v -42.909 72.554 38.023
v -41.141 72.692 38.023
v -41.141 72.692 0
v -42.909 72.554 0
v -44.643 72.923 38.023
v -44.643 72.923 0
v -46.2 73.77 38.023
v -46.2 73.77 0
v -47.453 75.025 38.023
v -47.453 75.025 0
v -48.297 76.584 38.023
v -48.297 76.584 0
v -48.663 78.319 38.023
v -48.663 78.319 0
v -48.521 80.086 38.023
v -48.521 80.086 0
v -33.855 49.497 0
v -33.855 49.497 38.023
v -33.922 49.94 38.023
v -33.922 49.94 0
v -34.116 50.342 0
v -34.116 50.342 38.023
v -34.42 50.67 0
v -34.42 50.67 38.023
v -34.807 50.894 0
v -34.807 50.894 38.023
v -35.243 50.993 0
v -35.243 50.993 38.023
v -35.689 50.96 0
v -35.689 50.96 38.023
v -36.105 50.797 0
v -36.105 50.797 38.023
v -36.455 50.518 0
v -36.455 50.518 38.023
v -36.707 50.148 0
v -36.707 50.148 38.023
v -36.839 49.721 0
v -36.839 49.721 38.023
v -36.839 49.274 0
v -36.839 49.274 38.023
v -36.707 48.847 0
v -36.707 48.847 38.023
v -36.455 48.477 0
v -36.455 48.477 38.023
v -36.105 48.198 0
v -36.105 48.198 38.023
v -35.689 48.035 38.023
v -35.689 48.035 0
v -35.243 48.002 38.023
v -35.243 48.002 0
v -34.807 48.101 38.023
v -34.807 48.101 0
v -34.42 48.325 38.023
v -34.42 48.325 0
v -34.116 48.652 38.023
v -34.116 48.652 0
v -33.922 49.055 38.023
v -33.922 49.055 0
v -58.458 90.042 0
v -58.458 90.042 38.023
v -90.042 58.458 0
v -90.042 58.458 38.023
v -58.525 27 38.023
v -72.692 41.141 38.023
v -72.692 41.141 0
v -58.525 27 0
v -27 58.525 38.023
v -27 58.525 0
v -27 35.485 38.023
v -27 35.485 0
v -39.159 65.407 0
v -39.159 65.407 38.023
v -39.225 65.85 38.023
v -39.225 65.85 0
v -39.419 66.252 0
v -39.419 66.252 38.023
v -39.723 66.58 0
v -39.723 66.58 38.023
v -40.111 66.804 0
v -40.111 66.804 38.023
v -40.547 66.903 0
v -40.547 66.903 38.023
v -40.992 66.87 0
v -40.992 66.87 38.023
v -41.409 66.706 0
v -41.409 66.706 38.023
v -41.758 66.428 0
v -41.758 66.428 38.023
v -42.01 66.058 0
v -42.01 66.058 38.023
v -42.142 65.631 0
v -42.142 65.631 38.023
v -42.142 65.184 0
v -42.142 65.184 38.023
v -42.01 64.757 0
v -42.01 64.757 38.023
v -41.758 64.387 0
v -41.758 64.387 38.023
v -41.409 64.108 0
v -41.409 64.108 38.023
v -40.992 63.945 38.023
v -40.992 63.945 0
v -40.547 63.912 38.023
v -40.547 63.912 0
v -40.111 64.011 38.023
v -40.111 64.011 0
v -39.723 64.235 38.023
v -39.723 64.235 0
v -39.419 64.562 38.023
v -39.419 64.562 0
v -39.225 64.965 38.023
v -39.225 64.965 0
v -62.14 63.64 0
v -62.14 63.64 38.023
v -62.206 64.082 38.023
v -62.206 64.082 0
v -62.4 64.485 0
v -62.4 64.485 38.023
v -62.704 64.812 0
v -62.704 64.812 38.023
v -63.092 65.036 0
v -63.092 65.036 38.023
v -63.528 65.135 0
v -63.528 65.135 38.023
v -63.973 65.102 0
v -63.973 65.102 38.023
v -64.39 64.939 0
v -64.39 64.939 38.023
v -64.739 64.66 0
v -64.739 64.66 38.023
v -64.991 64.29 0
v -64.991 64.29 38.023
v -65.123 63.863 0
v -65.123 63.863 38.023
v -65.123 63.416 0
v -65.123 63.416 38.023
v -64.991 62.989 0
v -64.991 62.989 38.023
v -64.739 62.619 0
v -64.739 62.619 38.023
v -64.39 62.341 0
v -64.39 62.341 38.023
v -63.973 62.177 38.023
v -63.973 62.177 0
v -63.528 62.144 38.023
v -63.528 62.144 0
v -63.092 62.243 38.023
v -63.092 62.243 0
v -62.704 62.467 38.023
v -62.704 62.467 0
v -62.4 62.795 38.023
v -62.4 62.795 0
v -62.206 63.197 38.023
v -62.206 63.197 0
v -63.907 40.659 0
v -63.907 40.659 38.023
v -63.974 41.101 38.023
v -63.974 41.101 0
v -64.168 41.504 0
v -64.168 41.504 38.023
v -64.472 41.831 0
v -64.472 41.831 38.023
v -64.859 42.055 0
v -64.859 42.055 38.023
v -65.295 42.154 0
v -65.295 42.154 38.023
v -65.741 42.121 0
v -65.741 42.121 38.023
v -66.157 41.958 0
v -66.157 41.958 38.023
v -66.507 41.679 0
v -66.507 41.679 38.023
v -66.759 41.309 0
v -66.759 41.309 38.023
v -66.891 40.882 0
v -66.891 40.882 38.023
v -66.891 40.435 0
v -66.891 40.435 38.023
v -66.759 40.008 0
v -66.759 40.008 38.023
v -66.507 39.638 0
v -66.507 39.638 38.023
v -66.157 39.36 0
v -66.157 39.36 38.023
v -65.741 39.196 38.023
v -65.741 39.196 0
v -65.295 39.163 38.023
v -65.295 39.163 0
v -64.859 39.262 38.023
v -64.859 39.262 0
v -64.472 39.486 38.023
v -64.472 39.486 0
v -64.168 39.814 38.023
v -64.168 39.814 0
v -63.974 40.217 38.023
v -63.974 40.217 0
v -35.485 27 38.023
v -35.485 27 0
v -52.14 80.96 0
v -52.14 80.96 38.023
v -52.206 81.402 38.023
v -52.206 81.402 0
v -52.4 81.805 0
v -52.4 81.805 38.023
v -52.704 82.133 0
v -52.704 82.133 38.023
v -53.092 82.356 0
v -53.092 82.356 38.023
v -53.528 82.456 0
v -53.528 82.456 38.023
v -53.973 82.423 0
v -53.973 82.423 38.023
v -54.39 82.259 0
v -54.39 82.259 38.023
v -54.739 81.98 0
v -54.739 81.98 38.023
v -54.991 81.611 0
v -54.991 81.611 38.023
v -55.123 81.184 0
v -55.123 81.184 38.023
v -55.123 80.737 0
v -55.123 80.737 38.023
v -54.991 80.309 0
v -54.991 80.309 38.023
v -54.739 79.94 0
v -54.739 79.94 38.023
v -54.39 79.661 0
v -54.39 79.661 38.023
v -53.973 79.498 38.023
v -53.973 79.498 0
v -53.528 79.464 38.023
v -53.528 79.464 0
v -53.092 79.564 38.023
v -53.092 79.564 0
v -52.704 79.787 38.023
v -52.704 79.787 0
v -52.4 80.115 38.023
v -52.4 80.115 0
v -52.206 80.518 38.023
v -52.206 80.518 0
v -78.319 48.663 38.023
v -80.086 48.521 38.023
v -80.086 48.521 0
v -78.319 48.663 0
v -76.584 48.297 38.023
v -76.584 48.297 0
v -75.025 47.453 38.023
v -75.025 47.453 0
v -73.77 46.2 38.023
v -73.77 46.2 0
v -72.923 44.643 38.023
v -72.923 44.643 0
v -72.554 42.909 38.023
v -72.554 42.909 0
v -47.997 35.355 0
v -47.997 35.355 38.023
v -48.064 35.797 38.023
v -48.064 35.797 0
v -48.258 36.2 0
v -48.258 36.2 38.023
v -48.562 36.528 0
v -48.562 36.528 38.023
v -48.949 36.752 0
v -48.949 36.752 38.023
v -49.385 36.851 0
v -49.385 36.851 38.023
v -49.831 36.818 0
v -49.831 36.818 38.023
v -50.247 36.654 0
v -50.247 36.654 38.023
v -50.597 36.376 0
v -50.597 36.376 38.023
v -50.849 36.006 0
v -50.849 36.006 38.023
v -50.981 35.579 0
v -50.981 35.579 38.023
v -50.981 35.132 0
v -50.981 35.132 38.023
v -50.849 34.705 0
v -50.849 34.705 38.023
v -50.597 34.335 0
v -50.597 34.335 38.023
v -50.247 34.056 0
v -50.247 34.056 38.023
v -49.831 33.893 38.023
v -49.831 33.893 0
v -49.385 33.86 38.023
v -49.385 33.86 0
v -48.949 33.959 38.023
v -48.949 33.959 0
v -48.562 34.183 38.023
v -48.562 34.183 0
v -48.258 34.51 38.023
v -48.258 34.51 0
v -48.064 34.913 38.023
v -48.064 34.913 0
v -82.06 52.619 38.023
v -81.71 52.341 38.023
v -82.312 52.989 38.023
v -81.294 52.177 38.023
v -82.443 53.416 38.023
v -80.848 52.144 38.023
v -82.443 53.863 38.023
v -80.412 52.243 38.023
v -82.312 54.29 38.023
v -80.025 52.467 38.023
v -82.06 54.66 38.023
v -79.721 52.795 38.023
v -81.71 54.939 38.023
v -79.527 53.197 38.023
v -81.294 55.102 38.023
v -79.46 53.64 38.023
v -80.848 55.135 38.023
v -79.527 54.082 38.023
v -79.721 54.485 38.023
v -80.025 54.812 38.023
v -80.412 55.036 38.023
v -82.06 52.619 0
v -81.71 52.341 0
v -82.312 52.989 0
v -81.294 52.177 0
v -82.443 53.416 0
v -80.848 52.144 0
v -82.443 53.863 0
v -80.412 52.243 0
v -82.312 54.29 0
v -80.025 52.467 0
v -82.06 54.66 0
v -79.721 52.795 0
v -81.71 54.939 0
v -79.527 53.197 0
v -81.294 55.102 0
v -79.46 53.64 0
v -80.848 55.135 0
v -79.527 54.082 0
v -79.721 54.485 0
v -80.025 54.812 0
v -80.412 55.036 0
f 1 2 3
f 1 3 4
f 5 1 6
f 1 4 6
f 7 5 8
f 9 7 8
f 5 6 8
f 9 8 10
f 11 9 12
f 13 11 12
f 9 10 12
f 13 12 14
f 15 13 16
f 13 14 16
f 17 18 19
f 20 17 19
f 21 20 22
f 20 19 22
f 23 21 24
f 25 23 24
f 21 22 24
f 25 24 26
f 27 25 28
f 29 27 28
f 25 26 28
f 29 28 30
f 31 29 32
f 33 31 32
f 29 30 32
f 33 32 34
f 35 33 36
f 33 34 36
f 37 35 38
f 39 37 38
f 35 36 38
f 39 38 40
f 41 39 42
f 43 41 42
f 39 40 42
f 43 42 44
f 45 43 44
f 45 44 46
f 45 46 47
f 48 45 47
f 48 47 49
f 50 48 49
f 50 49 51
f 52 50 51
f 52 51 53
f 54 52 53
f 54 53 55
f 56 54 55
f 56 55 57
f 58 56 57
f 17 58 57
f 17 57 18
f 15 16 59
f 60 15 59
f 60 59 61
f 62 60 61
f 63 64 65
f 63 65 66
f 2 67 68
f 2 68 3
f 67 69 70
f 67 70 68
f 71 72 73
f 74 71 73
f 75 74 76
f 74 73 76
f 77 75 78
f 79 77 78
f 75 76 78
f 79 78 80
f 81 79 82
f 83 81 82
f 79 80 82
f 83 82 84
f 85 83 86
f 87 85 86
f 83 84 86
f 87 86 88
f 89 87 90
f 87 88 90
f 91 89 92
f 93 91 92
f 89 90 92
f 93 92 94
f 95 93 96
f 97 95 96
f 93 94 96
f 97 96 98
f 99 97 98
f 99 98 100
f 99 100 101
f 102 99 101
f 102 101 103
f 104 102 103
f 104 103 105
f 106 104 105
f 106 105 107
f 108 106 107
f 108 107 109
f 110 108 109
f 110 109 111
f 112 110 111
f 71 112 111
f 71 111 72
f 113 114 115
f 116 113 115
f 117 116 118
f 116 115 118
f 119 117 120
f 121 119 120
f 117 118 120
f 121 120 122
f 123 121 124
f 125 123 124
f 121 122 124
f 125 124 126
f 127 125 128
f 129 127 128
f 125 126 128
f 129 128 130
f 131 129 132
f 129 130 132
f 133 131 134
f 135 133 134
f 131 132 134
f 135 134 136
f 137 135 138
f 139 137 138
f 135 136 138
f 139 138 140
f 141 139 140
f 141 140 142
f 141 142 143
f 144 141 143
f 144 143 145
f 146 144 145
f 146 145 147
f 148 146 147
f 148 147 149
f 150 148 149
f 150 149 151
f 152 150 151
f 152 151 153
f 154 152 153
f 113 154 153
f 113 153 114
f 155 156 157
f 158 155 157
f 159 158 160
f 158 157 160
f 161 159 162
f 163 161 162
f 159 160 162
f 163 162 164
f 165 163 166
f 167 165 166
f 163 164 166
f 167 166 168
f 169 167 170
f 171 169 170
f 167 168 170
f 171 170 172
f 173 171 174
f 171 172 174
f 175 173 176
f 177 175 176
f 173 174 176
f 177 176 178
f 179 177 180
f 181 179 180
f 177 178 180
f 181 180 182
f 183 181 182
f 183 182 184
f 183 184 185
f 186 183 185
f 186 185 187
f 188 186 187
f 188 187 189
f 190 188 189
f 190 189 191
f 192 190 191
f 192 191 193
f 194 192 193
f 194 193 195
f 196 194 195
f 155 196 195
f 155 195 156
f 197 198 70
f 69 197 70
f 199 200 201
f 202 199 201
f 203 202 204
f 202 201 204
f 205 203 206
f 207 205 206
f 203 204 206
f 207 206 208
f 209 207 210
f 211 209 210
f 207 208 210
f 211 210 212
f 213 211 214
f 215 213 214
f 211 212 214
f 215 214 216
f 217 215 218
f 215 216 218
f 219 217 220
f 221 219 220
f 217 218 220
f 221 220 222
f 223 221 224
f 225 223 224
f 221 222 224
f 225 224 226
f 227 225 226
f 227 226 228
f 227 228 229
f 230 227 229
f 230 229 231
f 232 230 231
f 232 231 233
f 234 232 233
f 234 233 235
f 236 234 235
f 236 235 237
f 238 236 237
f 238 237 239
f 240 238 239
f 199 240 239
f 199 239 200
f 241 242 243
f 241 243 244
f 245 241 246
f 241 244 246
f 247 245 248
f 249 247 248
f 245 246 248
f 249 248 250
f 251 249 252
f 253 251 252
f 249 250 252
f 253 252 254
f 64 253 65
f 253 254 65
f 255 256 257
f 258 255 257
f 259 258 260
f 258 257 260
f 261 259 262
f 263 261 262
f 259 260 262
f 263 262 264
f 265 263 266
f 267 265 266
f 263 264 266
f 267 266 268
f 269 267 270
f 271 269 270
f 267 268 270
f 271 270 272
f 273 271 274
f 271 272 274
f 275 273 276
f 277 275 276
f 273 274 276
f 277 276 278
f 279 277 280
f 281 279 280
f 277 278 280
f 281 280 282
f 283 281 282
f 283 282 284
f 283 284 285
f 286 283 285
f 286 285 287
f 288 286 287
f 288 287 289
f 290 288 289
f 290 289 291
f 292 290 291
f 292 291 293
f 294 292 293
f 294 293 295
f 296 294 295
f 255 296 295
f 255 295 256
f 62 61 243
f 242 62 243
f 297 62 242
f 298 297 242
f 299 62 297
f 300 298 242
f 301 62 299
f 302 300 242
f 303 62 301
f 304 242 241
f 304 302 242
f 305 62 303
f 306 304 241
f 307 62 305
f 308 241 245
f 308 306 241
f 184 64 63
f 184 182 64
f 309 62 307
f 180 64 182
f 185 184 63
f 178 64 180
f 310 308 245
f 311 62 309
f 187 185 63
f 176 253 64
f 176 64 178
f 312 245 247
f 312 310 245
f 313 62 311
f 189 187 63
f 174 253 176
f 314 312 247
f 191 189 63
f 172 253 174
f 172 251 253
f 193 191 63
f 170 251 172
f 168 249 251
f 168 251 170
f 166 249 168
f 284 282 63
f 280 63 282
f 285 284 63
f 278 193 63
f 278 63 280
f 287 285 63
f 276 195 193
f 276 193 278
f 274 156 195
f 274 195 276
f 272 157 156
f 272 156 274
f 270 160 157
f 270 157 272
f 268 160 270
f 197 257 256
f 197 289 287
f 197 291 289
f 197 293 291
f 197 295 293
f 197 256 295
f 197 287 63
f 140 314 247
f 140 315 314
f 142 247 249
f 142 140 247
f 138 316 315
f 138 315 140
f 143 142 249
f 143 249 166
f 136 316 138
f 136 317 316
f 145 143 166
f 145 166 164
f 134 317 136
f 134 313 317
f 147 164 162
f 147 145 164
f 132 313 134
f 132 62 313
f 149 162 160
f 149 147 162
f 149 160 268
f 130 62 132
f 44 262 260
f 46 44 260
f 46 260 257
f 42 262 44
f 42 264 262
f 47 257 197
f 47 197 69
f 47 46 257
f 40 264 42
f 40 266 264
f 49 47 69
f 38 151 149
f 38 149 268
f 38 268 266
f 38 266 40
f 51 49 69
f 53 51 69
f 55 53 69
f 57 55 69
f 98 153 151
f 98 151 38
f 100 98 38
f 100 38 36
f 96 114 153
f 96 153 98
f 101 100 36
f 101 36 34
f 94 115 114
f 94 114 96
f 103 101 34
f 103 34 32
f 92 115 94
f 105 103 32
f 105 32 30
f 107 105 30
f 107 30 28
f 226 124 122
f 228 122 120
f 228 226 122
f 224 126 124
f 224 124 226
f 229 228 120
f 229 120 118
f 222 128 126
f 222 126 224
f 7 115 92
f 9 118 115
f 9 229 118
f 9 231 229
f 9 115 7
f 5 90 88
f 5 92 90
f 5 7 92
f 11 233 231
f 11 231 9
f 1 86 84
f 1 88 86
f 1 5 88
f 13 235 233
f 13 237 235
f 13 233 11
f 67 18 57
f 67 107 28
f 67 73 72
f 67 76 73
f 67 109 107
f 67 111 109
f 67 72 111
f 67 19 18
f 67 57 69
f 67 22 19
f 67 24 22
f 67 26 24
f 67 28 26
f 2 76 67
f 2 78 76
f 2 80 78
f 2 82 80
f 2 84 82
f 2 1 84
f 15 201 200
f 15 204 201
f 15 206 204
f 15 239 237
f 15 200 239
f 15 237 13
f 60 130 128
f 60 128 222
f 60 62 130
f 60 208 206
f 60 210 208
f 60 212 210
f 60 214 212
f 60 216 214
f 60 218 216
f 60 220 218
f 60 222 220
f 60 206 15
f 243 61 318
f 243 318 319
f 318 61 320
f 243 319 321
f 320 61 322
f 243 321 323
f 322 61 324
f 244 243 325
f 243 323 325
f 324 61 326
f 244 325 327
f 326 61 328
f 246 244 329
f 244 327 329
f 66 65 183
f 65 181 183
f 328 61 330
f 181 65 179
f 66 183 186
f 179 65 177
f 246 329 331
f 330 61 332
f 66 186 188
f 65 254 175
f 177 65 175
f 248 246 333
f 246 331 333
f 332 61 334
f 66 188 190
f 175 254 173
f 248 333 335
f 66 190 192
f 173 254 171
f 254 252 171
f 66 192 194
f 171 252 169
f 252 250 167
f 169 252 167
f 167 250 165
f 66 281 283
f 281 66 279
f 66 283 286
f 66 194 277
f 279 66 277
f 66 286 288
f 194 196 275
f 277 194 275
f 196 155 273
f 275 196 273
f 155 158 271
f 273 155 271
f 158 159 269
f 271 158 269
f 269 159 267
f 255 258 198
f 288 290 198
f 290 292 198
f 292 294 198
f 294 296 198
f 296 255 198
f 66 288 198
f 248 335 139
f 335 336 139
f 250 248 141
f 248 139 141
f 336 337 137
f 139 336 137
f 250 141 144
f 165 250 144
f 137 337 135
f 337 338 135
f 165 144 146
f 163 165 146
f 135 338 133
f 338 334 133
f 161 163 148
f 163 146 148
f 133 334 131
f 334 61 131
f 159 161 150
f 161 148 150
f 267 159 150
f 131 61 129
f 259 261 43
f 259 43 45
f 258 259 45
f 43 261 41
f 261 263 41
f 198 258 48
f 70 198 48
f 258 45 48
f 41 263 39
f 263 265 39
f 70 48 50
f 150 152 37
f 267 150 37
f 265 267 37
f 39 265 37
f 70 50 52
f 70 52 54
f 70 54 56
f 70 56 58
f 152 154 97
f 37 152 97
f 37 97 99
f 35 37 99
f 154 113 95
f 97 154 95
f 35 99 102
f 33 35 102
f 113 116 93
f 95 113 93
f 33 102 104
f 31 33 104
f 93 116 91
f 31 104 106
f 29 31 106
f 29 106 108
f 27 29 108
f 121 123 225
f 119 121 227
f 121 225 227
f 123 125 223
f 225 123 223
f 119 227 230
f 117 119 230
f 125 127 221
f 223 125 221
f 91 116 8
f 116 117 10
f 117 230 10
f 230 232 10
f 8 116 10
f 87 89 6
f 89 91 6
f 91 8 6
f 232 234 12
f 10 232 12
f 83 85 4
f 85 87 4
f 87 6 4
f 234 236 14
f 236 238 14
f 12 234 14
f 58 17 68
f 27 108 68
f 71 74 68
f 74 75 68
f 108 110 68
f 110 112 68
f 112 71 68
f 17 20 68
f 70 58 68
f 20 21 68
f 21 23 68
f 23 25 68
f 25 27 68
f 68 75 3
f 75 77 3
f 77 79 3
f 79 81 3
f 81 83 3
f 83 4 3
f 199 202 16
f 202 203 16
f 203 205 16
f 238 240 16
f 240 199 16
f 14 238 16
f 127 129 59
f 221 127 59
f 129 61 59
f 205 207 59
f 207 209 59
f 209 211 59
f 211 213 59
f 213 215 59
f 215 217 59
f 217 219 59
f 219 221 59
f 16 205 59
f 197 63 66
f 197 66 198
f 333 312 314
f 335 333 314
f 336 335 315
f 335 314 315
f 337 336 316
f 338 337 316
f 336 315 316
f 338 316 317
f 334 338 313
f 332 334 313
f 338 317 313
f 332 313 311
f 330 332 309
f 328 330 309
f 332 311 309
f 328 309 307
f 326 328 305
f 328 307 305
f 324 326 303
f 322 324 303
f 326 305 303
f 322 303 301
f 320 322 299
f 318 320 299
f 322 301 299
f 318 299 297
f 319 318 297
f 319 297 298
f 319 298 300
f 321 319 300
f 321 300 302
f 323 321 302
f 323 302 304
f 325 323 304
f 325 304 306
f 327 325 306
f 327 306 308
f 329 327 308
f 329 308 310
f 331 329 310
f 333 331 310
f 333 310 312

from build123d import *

# Parameters (mm, degrees)
BOSS_EXTRUDE1_DEPTH = 38.0226
SKETCH4_R           = 1.5
CUT_EXTRUDE2_DEPTH  = 133.893603459


with BuildPart() as part:
    # Sketch1 → Boss-Extrude1 (new body)
    with BuildSketch(Plane.XY):
        with BuildLine():
            Line((-58.458365937, 90.041634063), (-90.041634063, 58.458365937))
            Line((-90.041634063, 58.458365937), (-80.085733054, 48.520837101))
            ThreePointArc((-80.085733054, 48.520837101), (-74.352118178, 46.871638295), (-72.692331868, 41.141079365))
            Line((-72.692331868, 41.141079365), (-58.525108947, 27))
            Line((-58.525108947, 27), (-35.485281374, 27))
            Line((-35.485281374, 27), (-27, 35.485281374))
            Line((-27, 35.485281374), (-27, 58.525108947))
            Line((-27, 58.525108947), (-41.141079365, 72.692331868))
            ThreePointArc((-41.141079365, 72.692331868), (-46.871638295, 74.352118178), (-48.520837101, 80.085733054))
            Line((-48.520837101, 80.085733054), (-58.458365937, 90.041634063))
        make_face()
    extrude(amount=BOSS_EXTRUDE1_DEPTH)

    # Sketch4 → Cut-Extrude2 (cut, through all)
    with BuildSketch(Plane.XY.offset(38.0226)):
        with Locations((-63.639610307, 63.639610307)):
            Circle(SKETCH4_R)
        with Locations((-80.960118382, 53.639610307)):
            Circle(SKETCH4_R)
        with Locations((-53.639610307, 80.960118382)):
            Circle(SKETCH4_R)
        with Locations((-40.658639918, 65.40737726)):
            Circle(SKETCH4_R)
        with Locations((-65.40737726, 40.658639918)):
            Circle(SKETCH4_R)
        with Locations((-49.497474683, 35.355339059)):
            Circle(SKETCH4_R)
        with Locations((-35.355339059, 49.497474683)):
            Circle(SKETCH4_R)
    extrude(amount=-CUT_EXTRUDE2_DEPTH, mode=Mode.SUBTRACT)


solid = part.part
